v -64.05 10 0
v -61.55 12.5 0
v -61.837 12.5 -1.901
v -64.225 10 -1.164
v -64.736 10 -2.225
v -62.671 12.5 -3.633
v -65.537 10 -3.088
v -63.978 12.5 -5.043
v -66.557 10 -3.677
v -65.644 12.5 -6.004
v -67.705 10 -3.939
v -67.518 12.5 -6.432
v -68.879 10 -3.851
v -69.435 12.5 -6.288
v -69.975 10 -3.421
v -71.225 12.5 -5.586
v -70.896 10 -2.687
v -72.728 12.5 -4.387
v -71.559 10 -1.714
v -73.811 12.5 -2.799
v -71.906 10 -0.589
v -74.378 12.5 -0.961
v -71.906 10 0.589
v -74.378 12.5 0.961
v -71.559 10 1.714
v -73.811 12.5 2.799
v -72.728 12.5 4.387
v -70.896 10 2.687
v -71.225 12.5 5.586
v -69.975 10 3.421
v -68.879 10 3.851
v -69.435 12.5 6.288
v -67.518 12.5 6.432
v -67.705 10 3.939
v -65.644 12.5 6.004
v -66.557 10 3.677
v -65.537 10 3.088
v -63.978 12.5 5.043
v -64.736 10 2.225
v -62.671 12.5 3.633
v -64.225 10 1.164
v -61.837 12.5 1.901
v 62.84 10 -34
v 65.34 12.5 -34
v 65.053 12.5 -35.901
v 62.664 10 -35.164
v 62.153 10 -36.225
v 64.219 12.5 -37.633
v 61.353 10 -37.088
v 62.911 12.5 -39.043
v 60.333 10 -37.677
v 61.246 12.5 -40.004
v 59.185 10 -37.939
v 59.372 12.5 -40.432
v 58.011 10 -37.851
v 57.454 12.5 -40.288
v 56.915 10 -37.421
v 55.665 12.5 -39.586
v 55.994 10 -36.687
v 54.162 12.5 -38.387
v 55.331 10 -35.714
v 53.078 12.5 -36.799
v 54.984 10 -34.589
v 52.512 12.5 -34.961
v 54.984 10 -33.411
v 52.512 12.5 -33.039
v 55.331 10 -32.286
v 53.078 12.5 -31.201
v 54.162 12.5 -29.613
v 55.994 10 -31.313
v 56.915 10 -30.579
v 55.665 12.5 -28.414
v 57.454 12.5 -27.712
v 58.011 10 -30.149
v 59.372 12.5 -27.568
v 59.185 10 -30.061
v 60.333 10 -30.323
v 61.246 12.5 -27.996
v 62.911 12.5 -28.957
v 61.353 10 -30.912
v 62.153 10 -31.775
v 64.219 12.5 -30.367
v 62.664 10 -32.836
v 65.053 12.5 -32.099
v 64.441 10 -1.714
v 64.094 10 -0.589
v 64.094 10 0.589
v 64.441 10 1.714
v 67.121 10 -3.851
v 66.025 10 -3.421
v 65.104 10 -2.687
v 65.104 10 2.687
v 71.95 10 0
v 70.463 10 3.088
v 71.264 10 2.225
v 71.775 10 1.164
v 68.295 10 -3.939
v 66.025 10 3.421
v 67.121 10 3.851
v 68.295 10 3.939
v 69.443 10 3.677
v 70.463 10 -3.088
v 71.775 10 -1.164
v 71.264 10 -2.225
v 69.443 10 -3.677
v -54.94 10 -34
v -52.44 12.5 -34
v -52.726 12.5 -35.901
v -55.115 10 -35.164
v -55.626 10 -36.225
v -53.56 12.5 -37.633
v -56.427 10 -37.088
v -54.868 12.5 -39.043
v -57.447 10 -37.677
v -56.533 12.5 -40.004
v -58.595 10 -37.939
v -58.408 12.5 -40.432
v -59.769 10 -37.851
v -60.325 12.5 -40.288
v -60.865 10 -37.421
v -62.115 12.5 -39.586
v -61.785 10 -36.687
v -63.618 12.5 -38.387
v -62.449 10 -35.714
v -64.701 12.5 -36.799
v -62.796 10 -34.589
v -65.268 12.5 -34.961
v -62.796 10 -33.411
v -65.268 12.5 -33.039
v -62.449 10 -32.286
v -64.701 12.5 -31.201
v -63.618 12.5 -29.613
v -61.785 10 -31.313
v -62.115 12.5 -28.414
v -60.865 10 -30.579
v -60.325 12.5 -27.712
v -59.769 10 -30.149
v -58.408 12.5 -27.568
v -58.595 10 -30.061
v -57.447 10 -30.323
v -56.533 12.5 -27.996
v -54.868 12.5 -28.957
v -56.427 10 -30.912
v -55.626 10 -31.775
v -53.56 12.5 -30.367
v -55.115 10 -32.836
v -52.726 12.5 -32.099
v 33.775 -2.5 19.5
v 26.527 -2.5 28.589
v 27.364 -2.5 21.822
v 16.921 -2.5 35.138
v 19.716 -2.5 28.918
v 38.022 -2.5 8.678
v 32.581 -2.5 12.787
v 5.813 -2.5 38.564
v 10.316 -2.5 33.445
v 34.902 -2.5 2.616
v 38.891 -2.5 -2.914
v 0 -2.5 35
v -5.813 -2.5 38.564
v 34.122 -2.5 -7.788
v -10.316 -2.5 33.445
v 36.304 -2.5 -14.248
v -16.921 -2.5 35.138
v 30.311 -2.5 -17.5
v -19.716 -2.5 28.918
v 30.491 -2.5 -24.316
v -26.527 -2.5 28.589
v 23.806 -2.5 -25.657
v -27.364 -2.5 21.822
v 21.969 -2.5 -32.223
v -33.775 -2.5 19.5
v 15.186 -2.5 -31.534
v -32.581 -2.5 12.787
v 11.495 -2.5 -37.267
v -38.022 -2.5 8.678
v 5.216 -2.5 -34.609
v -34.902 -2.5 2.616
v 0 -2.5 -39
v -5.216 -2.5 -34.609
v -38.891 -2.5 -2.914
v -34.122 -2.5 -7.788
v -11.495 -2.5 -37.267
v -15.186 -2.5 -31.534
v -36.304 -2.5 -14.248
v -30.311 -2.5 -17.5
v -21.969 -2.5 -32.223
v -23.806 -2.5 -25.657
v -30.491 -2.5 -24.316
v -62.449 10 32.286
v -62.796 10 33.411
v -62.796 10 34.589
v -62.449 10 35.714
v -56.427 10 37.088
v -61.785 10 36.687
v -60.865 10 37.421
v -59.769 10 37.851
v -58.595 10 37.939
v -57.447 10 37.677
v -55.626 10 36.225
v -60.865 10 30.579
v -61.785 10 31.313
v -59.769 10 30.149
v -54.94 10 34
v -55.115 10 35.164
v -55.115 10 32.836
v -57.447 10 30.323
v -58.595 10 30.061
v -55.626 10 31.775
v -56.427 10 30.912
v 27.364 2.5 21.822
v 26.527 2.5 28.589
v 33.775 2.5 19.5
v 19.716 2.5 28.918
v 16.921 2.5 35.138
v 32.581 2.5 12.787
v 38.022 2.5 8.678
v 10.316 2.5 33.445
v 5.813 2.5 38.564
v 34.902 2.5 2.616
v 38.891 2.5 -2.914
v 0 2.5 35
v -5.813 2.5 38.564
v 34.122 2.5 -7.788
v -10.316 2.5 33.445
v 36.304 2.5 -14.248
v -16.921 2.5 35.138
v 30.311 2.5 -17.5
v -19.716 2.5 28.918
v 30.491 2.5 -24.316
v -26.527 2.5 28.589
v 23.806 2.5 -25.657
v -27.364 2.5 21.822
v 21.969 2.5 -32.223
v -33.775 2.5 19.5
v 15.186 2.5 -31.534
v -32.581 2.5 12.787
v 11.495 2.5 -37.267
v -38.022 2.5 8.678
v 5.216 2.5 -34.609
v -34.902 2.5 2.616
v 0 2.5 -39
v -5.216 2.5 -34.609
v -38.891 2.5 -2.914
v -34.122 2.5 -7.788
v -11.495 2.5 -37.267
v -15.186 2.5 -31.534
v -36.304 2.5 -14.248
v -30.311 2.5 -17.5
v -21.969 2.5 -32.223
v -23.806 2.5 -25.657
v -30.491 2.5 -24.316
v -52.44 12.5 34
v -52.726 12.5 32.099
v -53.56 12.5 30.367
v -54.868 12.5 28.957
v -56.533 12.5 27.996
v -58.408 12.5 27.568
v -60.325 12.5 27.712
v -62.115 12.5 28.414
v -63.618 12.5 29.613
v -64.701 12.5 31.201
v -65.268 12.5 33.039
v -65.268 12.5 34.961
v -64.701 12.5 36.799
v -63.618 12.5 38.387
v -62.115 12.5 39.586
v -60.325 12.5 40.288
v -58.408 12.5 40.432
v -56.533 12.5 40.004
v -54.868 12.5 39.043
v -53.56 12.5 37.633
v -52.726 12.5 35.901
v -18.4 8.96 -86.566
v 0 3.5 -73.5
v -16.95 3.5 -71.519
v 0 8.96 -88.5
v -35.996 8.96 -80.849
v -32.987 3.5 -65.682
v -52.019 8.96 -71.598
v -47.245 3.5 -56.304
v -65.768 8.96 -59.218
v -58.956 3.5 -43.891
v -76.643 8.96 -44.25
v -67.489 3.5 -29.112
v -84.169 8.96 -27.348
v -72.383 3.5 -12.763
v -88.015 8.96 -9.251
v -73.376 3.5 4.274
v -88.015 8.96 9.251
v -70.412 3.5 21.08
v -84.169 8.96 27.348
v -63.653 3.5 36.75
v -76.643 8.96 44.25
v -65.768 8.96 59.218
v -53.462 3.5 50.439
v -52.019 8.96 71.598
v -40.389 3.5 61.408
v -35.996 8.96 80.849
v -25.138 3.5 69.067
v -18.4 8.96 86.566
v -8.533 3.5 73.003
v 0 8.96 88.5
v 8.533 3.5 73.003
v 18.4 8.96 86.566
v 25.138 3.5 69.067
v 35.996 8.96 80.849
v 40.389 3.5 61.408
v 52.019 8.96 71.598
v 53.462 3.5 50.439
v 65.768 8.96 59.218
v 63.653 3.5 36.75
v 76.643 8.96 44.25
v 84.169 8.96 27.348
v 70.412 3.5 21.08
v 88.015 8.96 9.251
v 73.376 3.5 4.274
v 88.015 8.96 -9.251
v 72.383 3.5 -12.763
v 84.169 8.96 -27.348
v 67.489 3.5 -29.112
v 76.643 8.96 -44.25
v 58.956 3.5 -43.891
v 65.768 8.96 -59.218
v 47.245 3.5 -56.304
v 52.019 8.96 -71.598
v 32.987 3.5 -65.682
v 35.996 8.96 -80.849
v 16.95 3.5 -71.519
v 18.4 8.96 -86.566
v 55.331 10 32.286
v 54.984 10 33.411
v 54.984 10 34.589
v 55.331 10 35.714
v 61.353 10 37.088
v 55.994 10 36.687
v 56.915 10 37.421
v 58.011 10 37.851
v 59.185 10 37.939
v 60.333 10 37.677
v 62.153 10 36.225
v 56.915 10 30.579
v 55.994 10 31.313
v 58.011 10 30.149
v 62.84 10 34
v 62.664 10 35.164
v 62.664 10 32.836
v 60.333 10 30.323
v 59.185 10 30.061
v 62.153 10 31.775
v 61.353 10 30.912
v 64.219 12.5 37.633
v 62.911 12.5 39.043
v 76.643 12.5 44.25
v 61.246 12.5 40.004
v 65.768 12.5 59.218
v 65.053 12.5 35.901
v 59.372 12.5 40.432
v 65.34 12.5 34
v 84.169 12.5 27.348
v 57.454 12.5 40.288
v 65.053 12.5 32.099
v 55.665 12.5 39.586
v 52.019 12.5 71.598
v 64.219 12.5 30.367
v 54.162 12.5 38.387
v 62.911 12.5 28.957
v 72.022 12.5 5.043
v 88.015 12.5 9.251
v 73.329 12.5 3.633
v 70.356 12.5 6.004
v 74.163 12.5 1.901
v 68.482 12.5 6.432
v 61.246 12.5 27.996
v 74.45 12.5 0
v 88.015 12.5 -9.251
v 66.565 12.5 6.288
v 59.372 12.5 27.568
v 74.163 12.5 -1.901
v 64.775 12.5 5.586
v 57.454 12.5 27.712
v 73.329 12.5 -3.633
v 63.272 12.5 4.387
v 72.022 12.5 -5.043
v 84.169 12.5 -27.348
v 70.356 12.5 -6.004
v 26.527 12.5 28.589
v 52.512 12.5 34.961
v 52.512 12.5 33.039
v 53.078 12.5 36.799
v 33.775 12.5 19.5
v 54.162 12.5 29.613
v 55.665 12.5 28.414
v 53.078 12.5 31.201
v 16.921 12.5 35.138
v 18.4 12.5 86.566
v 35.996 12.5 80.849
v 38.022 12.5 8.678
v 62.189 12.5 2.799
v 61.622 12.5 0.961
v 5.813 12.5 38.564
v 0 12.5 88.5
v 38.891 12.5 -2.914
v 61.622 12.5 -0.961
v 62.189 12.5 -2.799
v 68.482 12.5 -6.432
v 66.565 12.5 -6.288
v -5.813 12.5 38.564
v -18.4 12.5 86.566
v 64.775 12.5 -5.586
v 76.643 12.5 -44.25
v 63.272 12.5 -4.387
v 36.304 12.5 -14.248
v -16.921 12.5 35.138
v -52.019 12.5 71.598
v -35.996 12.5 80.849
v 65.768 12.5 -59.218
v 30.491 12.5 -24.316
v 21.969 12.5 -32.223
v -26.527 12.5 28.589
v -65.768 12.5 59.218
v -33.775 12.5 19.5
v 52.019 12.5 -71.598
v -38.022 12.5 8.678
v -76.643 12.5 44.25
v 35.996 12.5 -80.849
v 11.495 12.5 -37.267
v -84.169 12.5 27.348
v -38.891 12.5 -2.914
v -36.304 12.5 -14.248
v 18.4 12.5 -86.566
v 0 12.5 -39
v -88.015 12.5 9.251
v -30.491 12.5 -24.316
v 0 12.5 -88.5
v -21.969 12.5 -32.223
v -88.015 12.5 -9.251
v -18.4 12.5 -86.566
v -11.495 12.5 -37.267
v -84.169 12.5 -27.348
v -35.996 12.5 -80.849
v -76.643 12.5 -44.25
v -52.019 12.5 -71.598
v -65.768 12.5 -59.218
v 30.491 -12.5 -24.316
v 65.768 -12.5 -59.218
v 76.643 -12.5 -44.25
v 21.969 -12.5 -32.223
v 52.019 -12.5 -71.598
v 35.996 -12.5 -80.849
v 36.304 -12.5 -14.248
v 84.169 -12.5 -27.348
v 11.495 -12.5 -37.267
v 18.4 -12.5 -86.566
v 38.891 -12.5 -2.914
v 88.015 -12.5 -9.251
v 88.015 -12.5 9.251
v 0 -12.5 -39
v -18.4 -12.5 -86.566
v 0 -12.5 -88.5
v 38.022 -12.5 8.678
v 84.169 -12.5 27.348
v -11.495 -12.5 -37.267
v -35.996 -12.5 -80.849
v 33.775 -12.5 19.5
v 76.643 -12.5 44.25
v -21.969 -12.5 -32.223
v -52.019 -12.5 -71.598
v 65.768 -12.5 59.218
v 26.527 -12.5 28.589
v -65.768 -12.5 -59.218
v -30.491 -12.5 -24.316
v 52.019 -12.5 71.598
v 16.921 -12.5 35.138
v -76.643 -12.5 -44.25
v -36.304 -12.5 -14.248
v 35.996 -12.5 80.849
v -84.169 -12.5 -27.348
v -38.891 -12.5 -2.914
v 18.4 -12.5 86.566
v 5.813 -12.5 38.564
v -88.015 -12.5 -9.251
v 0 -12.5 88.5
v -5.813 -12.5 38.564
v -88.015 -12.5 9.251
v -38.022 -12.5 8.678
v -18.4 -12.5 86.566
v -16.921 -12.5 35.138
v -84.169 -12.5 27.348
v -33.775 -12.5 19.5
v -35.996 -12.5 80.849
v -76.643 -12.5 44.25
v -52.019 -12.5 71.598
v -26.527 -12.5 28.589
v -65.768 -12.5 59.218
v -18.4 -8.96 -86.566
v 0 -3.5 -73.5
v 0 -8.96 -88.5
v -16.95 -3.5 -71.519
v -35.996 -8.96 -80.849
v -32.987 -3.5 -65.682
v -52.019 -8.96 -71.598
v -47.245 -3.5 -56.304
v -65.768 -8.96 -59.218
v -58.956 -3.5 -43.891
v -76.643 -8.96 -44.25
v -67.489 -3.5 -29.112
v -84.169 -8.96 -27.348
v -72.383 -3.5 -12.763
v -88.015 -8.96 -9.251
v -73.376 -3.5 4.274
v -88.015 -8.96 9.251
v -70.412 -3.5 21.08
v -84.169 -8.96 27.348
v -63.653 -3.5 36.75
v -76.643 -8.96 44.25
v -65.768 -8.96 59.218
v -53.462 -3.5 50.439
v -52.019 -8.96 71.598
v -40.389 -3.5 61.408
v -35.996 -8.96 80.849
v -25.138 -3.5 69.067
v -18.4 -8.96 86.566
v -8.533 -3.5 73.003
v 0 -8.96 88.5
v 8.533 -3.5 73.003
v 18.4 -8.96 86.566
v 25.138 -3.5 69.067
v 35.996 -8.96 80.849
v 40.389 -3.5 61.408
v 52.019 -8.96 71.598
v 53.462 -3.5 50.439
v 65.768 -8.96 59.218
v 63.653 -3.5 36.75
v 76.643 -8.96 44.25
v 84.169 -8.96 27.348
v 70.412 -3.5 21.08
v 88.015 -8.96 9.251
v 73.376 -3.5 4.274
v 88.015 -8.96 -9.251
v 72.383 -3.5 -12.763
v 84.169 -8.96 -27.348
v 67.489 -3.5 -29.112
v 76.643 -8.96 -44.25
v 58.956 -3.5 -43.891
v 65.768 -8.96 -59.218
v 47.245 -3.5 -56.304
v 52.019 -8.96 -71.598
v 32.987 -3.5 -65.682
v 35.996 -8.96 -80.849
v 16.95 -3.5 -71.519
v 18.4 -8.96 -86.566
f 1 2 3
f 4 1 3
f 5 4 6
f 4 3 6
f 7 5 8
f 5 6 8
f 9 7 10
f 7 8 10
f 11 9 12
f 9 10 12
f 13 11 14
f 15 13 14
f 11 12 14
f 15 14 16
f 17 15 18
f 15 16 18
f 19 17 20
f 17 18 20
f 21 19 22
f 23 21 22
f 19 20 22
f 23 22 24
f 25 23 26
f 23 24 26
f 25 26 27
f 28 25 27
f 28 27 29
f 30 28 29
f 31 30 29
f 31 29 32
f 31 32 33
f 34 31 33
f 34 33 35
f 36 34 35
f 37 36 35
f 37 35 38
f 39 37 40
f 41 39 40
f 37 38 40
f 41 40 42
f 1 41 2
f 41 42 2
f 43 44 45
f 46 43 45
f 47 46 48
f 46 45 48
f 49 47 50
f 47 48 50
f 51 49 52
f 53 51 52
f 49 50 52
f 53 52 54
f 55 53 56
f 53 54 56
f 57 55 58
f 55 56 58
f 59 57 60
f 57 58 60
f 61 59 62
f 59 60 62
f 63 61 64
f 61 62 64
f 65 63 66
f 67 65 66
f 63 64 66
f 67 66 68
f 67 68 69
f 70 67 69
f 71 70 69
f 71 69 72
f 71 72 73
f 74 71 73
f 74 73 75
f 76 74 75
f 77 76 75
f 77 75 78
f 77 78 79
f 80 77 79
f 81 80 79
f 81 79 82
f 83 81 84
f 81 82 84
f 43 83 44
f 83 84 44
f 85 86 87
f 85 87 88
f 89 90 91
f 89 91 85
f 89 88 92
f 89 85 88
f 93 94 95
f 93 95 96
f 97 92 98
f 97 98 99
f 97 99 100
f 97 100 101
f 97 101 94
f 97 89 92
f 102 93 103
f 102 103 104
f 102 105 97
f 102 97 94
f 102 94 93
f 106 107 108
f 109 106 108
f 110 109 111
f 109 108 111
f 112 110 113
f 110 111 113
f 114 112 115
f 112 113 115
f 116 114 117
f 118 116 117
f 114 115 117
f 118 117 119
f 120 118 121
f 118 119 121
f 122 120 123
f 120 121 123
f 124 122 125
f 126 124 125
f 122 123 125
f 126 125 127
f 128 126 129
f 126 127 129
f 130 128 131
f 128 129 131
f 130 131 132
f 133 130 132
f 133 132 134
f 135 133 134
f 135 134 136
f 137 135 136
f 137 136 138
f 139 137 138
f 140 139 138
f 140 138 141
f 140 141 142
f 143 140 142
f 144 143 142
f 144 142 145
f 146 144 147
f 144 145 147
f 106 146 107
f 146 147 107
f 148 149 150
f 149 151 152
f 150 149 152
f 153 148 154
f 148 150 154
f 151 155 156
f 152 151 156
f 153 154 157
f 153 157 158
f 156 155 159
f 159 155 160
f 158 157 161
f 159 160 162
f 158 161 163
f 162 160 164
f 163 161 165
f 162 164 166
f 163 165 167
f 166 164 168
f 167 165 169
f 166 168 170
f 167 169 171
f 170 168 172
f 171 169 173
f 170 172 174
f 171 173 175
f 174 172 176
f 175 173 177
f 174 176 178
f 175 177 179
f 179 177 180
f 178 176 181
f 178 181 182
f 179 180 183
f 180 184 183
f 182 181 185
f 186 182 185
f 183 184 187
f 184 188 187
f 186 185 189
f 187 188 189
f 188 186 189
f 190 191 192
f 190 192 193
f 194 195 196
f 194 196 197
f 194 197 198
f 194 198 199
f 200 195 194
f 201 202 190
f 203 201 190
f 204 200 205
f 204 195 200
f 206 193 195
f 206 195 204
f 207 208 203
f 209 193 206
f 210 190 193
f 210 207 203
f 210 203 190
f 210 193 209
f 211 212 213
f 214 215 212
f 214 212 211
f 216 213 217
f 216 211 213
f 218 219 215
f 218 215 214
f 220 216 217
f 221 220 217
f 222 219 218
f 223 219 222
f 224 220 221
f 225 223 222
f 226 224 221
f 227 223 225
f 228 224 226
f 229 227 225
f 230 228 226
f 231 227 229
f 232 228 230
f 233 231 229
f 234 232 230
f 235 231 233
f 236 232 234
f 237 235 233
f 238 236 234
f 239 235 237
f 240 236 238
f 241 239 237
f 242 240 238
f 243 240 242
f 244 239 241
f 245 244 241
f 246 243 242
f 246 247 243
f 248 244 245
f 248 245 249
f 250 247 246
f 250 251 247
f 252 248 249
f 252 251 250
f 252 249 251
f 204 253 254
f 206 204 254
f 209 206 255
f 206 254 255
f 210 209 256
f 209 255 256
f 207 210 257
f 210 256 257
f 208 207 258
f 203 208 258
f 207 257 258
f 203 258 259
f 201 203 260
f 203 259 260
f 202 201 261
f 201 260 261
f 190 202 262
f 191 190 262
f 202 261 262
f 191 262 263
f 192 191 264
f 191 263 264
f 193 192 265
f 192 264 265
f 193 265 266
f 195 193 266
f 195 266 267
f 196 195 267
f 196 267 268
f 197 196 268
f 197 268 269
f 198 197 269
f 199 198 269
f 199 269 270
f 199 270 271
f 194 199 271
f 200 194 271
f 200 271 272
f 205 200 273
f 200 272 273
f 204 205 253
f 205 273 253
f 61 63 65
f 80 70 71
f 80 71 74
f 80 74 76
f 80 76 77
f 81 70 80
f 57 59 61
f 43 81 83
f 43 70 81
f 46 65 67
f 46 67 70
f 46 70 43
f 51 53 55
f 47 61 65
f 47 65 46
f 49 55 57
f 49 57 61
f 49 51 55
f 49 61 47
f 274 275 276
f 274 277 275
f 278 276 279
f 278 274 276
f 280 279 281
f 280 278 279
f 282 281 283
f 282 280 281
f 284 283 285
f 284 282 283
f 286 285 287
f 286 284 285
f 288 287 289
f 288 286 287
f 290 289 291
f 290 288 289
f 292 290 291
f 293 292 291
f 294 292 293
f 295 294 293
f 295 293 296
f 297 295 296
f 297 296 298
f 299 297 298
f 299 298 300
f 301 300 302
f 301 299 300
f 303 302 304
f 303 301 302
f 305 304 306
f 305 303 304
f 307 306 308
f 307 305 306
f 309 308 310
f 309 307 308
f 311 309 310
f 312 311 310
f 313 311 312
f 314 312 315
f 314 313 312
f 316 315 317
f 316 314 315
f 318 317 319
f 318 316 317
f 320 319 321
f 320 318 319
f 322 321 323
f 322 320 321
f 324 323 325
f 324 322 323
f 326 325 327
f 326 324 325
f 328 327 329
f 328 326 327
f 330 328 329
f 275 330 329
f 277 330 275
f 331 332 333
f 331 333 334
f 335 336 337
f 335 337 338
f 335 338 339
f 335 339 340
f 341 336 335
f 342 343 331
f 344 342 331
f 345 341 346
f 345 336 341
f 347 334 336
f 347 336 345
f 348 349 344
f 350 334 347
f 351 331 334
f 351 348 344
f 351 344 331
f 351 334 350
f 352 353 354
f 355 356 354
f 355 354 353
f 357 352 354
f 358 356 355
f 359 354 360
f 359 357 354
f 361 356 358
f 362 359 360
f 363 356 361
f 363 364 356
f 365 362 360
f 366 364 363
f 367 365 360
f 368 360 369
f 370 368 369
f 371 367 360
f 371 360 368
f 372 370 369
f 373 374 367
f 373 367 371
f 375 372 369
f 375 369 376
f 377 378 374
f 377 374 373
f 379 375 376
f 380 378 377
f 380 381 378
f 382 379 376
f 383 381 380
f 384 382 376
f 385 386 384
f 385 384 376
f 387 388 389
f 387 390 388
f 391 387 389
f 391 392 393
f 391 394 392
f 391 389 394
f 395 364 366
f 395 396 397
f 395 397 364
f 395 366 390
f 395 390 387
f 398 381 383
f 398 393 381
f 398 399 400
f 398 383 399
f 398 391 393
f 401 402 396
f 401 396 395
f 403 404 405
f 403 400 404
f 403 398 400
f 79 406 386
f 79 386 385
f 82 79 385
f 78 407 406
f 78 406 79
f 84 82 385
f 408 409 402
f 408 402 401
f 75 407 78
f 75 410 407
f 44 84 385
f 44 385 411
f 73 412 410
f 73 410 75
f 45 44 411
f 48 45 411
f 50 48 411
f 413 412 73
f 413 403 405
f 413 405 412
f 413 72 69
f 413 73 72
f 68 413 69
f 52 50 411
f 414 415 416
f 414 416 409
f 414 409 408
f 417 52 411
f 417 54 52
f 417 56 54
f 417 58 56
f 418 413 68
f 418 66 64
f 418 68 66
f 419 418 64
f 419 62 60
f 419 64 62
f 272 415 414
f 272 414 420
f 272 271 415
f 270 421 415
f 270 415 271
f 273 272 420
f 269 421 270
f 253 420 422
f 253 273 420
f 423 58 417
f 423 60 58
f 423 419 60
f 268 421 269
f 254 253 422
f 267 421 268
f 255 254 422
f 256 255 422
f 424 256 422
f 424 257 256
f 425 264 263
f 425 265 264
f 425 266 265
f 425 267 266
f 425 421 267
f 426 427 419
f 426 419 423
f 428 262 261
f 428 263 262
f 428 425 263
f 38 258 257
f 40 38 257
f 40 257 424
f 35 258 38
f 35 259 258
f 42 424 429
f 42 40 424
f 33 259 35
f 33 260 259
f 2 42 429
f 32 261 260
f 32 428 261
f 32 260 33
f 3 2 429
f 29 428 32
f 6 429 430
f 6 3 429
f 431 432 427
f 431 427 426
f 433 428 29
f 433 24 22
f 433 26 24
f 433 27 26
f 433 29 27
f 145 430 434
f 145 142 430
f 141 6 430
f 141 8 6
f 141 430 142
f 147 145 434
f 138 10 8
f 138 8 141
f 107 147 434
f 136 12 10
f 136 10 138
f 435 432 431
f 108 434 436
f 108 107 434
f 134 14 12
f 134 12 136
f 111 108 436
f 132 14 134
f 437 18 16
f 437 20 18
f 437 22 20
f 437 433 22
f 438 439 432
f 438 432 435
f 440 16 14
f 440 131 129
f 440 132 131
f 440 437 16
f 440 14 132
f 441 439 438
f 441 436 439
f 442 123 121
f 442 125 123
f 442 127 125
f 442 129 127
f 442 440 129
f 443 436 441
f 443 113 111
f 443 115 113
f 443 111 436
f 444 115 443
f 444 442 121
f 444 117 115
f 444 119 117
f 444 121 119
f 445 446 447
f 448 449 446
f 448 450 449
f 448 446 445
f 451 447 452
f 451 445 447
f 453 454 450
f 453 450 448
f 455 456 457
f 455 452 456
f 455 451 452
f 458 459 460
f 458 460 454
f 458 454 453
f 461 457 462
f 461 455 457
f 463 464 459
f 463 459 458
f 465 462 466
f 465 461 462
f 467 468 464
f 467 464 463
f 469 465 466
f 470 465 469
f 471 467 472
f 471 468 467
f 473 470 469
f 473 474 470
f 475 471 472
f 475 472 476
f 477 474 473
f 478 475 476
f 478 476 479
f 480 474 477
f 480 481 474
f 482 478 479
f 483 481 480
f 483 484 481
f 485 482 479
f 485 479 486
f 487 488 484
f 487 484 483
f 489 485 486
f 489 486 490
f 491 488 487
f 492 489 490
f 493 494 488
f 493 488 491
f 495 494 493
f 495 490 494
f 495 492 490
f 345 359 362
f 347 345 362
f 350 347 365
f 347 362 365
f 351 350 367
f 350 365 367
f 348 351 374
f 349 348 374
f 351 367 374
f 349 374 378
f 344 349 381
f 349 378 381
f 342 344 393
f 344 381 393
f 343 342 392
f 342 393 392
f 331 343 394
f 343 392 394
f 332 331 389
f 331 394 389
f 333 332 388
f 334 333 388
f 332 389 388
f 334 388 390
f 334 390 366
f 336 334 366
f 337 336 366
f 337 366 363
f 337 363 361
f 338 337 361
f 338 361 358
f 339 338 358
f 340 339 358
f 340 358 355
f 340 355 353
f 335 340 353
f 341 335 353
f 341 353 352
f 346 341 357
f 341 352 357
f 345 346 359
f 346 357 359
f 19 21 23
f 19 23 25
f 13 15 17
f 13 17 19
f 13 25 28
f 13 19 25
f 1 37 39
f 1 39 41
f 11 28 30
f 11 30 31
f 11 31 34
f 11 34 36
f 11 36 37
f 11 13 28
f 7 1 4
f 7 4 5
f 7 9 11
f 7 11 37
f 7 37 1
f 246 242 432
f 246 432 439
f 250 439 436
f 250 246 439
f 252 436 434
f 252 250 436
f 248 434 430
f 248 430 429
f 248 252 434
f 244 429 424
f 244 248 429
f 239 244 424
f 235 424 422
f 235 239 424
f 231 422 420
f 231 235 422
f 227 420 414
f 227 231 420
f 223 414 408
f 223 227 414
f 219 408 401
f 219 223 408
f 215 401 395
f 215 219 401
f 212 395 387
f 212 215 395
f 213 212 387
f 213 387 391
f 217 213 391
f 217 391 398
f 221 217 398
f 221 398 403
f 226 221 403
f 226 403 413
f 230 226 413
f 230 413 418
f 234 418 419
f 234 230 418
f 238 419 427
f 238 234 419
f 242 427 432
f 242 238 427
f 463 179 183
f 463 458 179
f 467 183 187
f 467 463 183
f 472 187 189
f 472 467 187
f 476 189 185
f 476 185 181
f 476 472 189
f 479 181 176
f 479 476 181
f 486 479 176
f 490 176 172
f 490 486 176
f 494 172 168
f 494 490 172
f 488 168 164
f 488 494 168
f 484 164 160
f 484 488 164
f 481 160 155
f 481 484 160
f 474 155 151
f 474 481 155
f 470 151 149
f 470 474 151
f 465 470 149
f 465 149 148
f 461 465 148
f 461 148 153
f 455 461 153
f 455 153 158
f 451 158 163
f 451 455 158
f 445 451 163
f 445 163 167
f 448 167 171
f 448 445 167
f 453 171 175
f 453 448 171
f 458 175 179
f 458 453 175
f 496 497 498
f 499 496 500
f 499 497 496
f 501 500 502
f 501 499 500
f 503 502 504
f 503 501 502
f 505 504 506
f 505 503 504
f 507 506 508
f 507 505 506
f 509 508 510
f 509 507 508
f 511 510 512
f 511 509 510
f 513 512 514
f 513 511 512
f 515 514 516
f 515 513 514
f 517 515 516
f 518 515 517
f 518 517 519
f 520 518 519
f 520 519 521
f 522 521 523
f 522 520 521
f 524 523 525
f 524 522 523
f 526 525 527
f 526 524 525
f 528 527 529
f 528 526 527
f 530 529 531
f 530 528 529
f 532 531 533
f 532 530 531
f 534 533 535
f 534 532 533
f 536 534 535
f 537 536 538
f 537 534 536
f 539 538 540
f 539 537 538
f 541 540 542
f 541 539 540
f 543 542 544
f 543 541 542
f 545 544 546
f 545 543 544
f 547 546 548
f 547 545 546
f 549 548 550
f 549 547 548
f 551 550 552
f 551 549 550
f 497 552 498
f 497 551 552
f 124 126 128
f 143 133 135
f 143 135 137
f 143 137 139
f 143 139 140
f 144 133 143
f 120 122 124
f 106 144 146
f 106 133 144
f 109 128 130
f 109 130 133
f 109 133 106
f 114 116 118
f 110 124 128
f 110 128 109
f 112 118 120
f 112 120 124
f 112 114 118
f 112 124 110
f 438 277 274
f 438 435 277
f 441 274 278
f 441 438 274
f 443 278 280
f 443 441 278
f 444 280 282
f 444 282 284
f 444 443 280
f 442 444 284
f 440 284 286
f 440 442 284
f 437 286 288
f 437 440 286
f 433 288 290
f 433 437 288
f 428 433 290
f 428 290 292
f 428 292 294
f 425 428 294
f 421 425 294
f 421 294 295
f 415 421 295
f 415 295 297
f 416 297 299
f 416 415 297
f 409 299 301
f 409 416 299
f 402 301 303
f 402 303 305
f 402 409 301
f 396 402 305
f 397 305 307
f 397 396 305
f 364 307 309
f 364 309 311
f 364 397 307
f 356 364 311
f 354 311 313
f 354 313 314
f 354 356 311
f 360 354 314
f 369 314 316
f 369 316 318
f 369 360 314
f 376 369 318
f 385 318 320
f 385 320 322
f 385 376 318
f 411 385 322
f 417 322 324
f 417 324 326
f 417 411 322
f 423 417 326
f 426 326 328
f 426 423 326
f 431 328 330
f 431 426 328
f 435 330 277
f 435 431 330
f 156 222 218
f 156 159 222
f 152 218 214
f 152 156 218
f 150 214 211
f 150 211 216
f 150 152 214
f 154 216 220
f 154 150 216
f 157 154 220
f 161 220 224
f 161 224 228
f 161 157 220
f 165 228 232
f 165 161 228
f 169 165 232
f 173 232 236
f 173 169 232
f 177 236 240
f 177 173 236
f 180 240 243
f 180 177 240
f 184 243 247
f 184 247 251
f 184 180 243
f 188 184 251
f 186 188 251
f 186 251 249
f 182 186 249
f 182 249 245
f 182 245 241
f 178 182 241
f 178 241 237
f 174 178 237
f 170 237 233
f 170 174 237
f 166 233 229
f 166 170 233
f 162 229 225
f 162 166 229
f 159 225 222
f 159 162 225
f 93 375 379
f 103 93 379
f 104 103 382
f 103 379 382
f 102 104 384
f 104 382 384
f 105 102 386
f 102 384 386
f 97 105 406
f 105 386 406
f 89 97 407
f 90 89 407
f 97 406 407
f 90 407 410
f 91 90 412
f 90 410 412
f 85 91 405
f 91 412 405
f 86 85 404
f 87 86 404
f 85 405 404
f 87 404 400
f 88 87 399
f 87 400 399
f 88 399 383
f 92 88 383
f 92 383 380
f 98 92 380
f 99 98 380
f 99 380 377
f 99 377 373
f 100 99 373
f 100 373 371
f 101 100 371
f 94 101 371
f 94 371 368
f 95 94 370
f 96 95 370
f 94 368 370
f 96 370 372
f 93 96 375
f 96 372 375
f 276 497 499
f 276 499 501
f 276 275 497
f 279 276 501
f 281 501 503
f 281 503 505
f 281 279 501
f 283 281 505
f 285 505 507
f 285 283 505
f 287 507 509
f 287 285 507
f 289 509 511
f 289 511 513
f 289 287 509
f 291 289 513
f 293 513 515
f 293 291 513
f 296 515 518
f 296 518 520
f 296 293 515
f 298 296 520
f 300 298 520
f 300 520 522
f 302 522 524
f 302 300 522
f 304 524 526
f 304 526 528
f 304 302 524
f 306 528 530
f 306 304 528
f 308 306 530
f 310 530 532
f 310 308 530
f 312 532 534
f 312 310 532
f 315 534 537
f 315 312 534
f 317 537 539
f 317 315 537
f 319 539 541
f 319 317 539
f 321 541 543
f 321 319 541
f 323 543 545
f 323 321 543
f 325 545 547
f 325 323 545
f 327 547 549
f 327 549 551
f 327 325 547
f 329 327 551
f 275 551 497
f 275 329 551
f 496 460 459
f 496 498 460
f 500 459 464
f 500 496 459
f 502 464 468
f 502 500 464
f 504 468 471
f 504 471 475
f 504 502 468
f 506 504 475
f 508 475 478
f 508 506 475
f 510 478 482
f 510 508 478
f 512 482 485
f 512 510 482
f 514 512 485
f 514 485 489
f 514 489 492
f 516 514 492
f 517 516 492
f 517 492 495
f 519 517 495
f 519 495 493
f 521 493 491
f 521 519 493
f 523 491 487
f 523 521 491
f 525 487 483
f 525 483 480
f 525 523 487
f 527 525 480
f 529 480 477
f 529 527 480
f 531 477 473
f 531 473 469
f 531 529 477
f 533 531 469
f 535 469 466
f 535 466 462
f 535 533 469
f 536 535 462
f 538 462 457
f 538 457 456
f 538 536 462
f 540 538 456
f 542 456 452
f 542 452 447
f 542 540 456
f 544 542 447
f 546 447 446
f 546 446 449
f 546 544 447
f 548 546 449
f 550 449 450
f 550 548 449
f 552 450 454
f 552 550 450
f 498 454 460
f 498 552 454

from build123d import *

# Parameters (mm, degrees)
CROQUIS9_R                      = 6.45
CORTAR_EXTRUIR1_DEPTH           = 2.5
CORTAR_EXTRUIR1_DRAFT           = -45
CORTAR_EXTRUIR1_PROFILE_2_DEPTH = 2.5
CORTAR_EXTRUIR1_PROFILE_2_DRAFT = -45
CORTAR_EXTRUIR1_PROFILE_3_DEPTH = 2.5
CORTAR_EXTRUIR1_PROFILE_3_DRAFT = -45
CORTAR_EXTRUIR1_PROFILE_4_DEPTH = 2.5
CORTAR_EXTRUIR1_PROFILE_4_DRAFT = -45
CORTAR_EXTRUIR1_PROFILE_5_DEPTH = 2.5
CORTAR_EXTRUIR1_PROFILE_5_DRAFT = -45
CORTAR_EXTRUIR1_PROFILE_6_DEPTH = 2.5
CORTAR_EXTRUIR1_PROFILE_6_DRAFT = -45
CROQUIS10_R                     = 39
CROQUIS10_R_2                   = 35
SALIENTE_EXTRUIR1_DEPTH         = 2.5


with BuildPart() as part:
    # Croquis5 → Revolución2 (revolve)
    with BuildSketch(Plane(origin=(0, 0, 0), x_dir=(0, 0, -1), z_dir=(1, 0, 0))):
        Polygon((39, 12.5), (39, -12.5), (88.5, -12.5), (88.5, -8.959553514), (73.5, -3.5), (73.5, 3.5), (88.5, 8.959553514), (88.5, 12.5), align=None)
    revolve(axis=Axis((0, 0, 0), (0, 1, 0)))


with BuildPart() as cortar_extruir1_tool:
    # Croquis9 → Cortar-Extruir1 (with draft: the straight prism first)
    with BuildSketch(Plane(origin=(0, 12.5, 0), x_dir=(1, 0, 0), z_dir=(0, 1, 0))):
        with Locations((58.889727457, 34)):
            Circle(CROQUIS9_R)
    extrude(amount=-CORTAR_EXTRUIR1_DEPTH)
    # Cortar-Extruir1: the draft: its side faces are tilted about the plane it starts from
    cortar_extruir1_sides = [cortar_extruir1_tool.faces().sort_by_distance(p)[0] for p in [
        (52.439727457, 11.25, -34),
    ]]
    draft(cortar_extruir1_sides, Plane(origin=(0, 12.5, 0), x_dir=(1, 0, 0), z_dir=(0, 1, 0)), CORTAR_EXTRUIR1_DRAFT)


with BuildPart() as part_1:
    add(part.part)

    # Cortar-Extruir1: cut by cortar_extruir1_tool
    add(cortar_extruir1_tool.part, mode=Mode.SUBTRACT)


with BuildPart() as cortar_extruir1_profile_2_tool:
    # Croquis9 → Cortar-Extruir1 profile 2 (with draft: the straight prism first)
    with BuildSketch(Plane(origin=(0, 12.5, 0), x_dir=(1, 0, 0), z_dir=(0, 1, 0))):
        with Locations((68, 0)):
            Circle(CROQUIS9_R)
    extrude(amount=-CORTAR_EXTRUIR1_PROFILE_2_DEPTH)
    # Cortar-Extruir1 profile 2: the draft: its side faces are tilted about the plane it starts from
    cortar_extruir1_profile_2_sides = [cortar_extruir1_profile_2_tool.faces().sort_by_distance(p)[0] for p in [
        (61.55, 11.25, 0),
    ]]
    draft(cortar_extruir1_profile_2_sides, Plane(origin=(0, 12.5, 0), x_dir=(1, 0, 0), z_dir=(0, 1, 0)), CORTAR_EXTRUIR1_PROFILE_2_DRAFT)


with BuildPart() as part_2:
    add(part_1.part)

    # Cortar-Extruir1 profile 2: cut by cortar_extruir1_profile_2_tool
    add(cortar_extruir1_profile_2_tool.part, mode=Mode.SUBTRACT)


with BuildPart() as cortar_extruir1_profile_3_tool:
    # Croquis9 → Cortar-Extruir1 profile 3 (with draft: the straight prism first)
    with BuildSketch(Plane(origin=(0, 12.5, 0), x_dir=(1, 0, 0), z_dir=(0, 1, 0))):
        with Locations((58.889727457, -34)):
            Circle(CROQUIS9_R)
    extrude(amount=-CORTAR_EXTRUIR1_PROFILE_3_DEPTH)
    # Cortar-Extruir1 profile 3: the draft: its side faces are tilted about the plane it starts from
    cortar_extruir1_profile_3_sides = [cortar_extruir1_profile_3_tool.faces().sort_by_distance(p)[0] for p in [
        (52.439727457, 11.25, 34),
    ]]
    draft(cortar_extruir1_profile_3_sides, Plane(origin=(0, 12.5, 0), x_dir=(1, 0, 0), z_dir=(0, 1, 0)), CORTAR_EXTRUIR1_PROFILE_3_DRAFT)


with BuildPart() as part_3:
    add(part_2.part)

    # Cortar-Extruir1 profile 3: cut by cortar_extruir1_profile_3_tool
    add(cortar_extruir1_profile_3_tool.part, mode=Mode.SUBTRACT)


with BuildPart() as cortar_extruir1_profile_4_tool:
    # Croquis9 → Cortar-Extruir1 profile 4 (with draft: the straight prism first)
    with BuildSketch(Plane(origin=(0, 12.5, 0), x_dir=(1, 0, 0), z_dir=(0, 1, 0))):
        with Locations((-58.889727457, -34)):
            Circle(CROQUIS9_R)
    extrude(amount=-CORTAR_EXTRUIR1_PROFILE_4_DEPTH)
    # Cortar-Extruir1 profile 4: the draft: its side faces are tilted about the plane it starts from
    cortar_extruir1_profile_4_sides = [cortar_extruir1_profile_4_tool.faces().sort_by_distance(p)[0] for p in [
        (-65.339727457, 11.25, 34),
    ]]
    draft(cortar_extruir1_profile_4_sides, Plane(origin=(0, 12.5, 0), x_dir=(1, 0, 0), z_dir=(0, 1, 0)), CORTAR_EXTRUIR1_PROFILE_4_DRAFT)


with BuildPart() as part_4:
    add(part_3.part)

    # Cortar-Extruir1 profile 4: cut by cortar_extruir1_profile_4_tool
    add(cortar_extruir1_profile_4_tool.part, mode=Mode.SUBTRACT)


with BuildPart() as cortar_extruir1_profile_5_tool:
    # Croquis9 → Cortar-Extruir1 profile 5 (with draft: the straight prism first)
    with BuildSketch(Plane(origin=(0, 12.5, 0), x_dir=(1, 0, 0), z_dir=(0, 1, 0))):
        with Locations((-68, 0)):
            Circle(CROQUIS9_R)
    extrude(amount=-CORTAR_EXTRUIR1_PROFILE_5_DEPTH)
    # Cortar-Extruir1 profile 5: the draft: its side faces are tilted about the plane it starts from
    cortar_extruir1_profile_5_sides = [cortar_extruir1_profile_5_tool.faces().sort_by_distance(p)[0] for p in [
        (-74.45, 11.25, 0),
    ]]
    draft(cortar_extruir1_profile_5_sides, Plane(origin=(0, 12.5, 0), x_dir=(1, 0, 0), z_dir=(0, 1, 0)), CORTAR_EXTRUIR1_PROFILE_5_DRAFT)


with BuildPart() as part_5:
    add(part_4.part)

    # Cortar-Extruir1 profile 5: cut by cortar_extruir1_profile_5_tool
    add(cortar_extruir1_profile_5_tool.part, mode=Mode.SUBTRACT)


with BuildPart() as cortar_extruir1_profile_6_tool:
    # Croquis9 → Cortar-Extruir1 profile 6 (with draft: the straight prism first)
    with BuildSketch(Plane(origin=(0, 12.5, 0), x_dir=(1, 0, 0), z_dir=(0, 1, 0))):
        with Locations((-58.889727457, 34)):
            Circle(CROQUIS9_R)
    extrude(amount=-CORTAR_EXTRUIR1_PROFILE_6_DEPTH)
    # Cortar-Extruir1 profile 6: the draft: its side faces are tilted about the plane it starts from
    cortar_extruir1_profile_6_sides = [cortar_extruir1_profile_6_tool.faces().sort_by_distance(p)[0] for p in [
        (-65.339727457, 11.25, -34),
    ]]
    draft(cortar_extruir1_profile_6_sides, Plane(origin=(0, 12.5, 0), x_dir=(1, 0, 0), z_dir=(0, 1, 0)), CORTAR_EXTRUIR1_PROFILE_6_DRAFT)


with BuildPart() as part_6:
    add(part_5.part)

    # Cortar-Extruir1 profile 6: cut by cortar_extruir1_profile_6_tool
    add(cortar_extruir1_profile_6_tool.part, mode=Mode.SUBTRACT)

    # Croquis10 → Saliente-Extruir1 (add, symmetric)
    with BuildSketch(Plane(origin=(0, 0, 0), x_dir=(1, 0, 0), z_dir=(0, 1, 0))):
        with Locations(Location((0, 0, 0), (0, 0, 90))):
            Circle(CROQUIS10_R)
        with Locations(Location((0, 0, 0), (0, 0, 270))):
            Circle(CROQUIS10_R_2, mode=Mode.SUBTRACT)
    extrude(amount=SALIENTE_EXTRUIR1_DEPTH, both=True)


solid = part_6.part
